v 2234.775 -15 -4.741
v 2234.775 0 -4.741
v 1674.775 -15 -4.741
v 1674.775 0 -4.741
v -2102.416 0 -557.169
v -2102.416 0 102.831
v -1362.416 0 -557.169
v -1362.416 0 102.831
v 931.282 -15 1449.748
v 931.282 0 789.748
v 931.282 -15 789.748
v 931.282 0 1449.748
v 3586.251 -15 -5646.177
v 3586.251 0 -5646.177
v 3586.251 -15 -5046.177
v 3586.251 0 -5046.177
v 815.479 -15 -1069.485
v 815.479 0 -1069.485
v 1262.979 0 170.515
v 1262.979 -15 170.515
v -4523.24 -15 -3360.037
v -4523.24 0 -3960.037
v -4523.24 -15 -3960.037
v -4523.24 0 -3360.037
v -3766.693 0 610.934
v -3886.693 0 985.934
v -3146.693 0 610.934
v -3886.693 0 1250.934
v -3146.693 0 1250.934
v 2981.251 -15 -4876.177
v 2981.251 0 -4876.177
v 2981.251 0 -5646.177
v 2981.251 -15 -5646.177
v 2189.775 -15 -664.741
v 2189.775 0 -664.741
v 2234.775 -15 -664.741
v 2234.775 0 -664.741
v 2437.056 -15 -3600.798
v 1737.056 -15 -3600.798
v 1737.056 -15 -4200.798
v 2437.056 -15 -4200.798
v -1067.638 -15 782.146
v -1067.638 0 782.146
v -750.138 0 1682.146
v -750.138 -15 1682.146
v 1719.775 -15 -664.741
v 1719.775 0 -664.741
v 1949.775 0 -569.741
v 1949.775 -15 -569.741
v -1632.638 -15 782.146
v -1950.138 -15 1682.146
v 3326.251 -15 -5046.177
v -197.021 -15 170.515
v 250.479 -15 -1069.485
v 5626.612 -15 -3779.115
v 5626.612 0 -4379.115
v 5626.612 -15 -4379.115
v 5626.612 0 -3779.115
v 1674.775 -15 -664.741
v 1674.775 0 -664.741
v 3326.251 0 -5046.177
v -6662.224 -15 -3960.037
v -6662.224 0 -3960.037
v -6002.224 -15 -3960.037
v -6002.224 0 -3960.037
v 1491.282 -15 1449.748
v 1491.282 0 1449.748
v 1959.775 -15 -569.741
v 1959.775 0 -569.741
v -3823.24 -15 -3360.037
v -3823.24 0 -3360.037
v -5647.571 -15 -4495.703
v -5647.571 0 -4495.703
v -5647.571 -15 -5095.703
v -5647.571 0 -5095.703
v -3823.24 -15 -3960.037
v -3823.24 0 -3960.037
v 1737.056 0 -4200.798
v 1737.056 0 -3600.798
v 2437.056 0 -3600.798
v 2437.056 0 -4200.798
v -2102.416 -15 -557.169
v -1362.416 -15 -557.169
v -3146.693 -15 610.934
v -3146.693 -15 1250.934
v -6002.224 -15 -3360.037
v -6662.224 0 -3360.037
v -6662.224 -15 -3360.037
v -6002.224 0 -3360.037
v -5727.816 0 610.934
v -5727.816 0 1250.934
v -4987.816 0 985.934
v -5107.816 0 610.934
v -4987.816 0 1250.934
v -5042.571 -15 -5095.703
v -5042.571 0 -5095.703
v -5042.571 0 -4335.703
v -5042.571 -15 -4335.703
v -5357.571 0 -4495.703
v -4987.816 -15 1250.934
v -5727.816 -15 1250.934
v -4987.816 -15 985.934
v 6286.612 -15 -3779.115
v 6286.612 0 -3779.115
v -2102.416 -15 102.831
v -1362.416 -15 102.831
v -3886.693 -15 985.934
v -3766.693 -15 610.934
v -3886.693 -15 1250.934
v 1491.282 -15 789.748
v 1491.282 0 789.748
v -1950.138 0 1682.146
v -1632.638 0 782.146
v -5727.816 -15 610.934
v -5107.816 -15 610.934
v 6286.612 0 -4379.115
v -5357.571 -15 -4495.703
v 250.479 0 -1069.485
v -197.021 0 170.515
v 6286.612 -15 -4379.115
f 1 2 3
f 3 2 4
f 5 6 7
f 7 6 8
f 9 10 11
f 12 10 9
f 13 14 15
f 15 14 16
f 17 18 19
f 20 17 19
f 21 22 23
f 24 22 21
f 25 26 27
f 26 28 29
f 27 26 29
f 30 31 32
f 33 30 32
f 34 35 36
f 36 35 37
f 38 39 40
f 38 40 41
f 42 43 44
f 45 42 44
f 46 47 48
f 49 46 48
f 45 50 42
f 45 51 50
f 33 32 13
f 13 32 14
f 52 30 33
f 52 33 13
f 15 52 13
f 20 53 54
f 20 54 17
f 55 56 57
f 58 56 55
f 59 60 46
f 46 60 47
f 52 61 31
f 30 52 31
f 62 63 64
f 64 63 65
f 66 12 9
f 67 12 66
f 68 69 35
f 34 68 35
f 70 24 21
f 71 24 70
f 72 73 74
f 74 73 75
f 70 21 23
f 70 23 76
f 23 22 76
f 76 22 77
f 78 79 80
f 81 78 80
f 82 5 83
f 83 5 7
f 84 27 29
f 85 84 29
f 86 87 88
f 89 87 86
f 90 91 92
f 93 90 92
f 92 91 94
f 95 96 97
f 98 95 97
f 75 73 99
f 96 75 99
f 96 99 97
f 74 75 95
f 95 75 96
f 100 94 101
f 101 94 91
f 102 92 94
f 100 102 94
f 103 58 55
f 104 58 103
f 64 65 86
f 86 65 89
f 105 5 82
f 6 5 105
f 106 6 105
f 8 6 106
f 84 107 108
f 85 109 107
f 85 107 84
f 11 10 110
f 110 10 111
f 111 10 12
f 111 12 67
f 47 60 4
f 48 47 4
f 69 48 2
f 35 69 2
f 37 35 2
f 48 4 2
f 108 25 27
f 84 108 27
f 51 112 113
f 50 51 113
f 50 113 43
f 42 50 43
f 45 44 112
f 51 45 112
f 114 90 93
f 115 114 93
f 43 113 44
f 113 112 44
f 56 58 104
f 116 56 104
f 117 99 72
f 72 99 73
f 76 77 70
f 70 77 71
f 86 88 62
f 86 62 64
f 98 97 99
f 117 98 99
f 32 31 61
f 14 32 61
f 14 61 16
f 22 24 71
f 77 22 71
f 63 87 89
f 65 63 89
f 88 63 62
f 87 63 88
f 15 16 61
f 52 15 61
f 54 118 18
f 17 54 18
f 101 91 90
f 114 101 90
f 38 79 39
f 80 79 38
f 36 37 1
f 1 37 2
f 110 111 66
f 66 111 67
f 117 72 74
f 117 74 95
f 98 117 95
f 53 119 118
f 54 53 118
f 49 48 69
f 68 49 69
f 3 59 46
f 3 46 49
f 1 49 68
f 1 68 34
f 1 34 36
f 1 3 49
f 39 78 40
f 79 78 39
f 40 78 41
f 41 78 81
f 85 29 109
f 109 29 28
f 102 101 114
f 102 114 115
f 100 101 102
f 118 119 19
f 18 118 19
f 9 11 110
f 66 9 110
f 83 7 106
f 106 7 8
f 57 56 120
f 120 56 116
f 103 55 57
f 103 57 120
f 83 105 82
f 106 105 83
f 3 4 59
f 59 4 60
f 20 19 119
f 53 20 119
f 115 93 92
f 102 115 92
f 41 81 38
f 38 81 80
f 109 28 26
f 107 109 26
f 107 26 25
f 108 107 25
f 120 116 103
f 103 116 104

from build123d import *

# Parameters (mm, degrees)
F0_W     = 740
F0_H     = 660
F1_DEPTH = 15
F2_W     = 560
F2_H     = 660
F3_DEPTH = 15
F4_W     = 660
F4_H     = 600
F4_W_2   = 700
F5_DEPTH = 15
F6_W     = 700
F6_H     = 600
F6_W_2   = 660
F7_DEPTH = 15


with BuildPart() as f1:
    # F0 (on Front) → F1 (new body)
    with BuildSketch(Plane.XZ):
        Polygon((1262.978637, 170.515314), (-197.021363, 170.515314), (250.478637, -1069.484686), (815.478637, -1069.484686), align=None)
        Polygon((2234.775333, -4.741458), (1674.775333, -4.741458), (1674.775333, -664.741458), (1719.775333, -664.741458), (1949.775333, -569.741458), (1959.775333, -569.741458), (2189.775333, -664.741458), (2234.775333, -664.741458), align=None)
        with Locations((-1732.416272, -227.169156)):
            Rectangle(F0_W, F0_H)
    extrude(amount=F1_DEPTH)


with BuildPart() as f3:
    # F2 (on Front) → F3 (new body)
    with BuildSketch(Plane.XZ):
        Polygon((-1632.637649, 782.145834), (-1067.637649, 782.145834), (-750.137649, 1682.145834), (-1950.137649, 1682.145834), align=None)
        with Locations((1211.282105, 1119.74849)):
            Rectangle(F2_W, F2_H)
        Polygon((-4987.816105, 1250.934377), (-5727.816105, 1250.934377), (-5727.816105, 610.934377), (-5107.816105, 610.934377), (-4987.816105, 985.934377), align=None)
        Polygon((-3146.692753, 610.934377), (-3146.692753, 1250.934377), (-3886.692753, 1250.934377), (-3886.692753, 985.934377), (-3766.692753, 610.934377), align=None)
    extrude(amount=F3_DEPTH)


with BuildPart() as f5:
    # F4 (on Front) → F5 (new body)
    with BuildSketch(Plane.XZ):
        with Locations((-6332.223969, -3660.037231)):
            Rectangle(F4_W, F4_H)
        with Locations((-4173.239613, -3660.037231)):
            Rectangle(F4_W_2, F4_H)
        Polygon((-5042.57061, -4335.703125), (-5357.57061, -4495.703125), (-5647.57061, -4495.703125), (-5647.57061, -5095.703125), (-5042.57061, -5095.703125), align=None)
    extrude(amount=F5_DEPTH)


with BuildPart() as f7:
    # F6 (on Front) → F7 (new body)
    with BuildSketch(Plane.XZ):
        with Locations((2087.056303, -3900.798035)):
            Rectangle(F6_W, F6_H)
        with Locations((5956.612034, -4079.115105)):
            Rectangle(F6_W_2, F6_H)
        Polygon((2981.250792, -4876.176815), (2981.250792, -5646.176815), (3586.250792, -5646.176815), (3586.250792, -5046.176815), (3326.250792, -5046.176815), align=None)
    extrude(amount=F7_DEPTH)


solid = Compound([f1.part, f3.part, f5.part, f7.part])
